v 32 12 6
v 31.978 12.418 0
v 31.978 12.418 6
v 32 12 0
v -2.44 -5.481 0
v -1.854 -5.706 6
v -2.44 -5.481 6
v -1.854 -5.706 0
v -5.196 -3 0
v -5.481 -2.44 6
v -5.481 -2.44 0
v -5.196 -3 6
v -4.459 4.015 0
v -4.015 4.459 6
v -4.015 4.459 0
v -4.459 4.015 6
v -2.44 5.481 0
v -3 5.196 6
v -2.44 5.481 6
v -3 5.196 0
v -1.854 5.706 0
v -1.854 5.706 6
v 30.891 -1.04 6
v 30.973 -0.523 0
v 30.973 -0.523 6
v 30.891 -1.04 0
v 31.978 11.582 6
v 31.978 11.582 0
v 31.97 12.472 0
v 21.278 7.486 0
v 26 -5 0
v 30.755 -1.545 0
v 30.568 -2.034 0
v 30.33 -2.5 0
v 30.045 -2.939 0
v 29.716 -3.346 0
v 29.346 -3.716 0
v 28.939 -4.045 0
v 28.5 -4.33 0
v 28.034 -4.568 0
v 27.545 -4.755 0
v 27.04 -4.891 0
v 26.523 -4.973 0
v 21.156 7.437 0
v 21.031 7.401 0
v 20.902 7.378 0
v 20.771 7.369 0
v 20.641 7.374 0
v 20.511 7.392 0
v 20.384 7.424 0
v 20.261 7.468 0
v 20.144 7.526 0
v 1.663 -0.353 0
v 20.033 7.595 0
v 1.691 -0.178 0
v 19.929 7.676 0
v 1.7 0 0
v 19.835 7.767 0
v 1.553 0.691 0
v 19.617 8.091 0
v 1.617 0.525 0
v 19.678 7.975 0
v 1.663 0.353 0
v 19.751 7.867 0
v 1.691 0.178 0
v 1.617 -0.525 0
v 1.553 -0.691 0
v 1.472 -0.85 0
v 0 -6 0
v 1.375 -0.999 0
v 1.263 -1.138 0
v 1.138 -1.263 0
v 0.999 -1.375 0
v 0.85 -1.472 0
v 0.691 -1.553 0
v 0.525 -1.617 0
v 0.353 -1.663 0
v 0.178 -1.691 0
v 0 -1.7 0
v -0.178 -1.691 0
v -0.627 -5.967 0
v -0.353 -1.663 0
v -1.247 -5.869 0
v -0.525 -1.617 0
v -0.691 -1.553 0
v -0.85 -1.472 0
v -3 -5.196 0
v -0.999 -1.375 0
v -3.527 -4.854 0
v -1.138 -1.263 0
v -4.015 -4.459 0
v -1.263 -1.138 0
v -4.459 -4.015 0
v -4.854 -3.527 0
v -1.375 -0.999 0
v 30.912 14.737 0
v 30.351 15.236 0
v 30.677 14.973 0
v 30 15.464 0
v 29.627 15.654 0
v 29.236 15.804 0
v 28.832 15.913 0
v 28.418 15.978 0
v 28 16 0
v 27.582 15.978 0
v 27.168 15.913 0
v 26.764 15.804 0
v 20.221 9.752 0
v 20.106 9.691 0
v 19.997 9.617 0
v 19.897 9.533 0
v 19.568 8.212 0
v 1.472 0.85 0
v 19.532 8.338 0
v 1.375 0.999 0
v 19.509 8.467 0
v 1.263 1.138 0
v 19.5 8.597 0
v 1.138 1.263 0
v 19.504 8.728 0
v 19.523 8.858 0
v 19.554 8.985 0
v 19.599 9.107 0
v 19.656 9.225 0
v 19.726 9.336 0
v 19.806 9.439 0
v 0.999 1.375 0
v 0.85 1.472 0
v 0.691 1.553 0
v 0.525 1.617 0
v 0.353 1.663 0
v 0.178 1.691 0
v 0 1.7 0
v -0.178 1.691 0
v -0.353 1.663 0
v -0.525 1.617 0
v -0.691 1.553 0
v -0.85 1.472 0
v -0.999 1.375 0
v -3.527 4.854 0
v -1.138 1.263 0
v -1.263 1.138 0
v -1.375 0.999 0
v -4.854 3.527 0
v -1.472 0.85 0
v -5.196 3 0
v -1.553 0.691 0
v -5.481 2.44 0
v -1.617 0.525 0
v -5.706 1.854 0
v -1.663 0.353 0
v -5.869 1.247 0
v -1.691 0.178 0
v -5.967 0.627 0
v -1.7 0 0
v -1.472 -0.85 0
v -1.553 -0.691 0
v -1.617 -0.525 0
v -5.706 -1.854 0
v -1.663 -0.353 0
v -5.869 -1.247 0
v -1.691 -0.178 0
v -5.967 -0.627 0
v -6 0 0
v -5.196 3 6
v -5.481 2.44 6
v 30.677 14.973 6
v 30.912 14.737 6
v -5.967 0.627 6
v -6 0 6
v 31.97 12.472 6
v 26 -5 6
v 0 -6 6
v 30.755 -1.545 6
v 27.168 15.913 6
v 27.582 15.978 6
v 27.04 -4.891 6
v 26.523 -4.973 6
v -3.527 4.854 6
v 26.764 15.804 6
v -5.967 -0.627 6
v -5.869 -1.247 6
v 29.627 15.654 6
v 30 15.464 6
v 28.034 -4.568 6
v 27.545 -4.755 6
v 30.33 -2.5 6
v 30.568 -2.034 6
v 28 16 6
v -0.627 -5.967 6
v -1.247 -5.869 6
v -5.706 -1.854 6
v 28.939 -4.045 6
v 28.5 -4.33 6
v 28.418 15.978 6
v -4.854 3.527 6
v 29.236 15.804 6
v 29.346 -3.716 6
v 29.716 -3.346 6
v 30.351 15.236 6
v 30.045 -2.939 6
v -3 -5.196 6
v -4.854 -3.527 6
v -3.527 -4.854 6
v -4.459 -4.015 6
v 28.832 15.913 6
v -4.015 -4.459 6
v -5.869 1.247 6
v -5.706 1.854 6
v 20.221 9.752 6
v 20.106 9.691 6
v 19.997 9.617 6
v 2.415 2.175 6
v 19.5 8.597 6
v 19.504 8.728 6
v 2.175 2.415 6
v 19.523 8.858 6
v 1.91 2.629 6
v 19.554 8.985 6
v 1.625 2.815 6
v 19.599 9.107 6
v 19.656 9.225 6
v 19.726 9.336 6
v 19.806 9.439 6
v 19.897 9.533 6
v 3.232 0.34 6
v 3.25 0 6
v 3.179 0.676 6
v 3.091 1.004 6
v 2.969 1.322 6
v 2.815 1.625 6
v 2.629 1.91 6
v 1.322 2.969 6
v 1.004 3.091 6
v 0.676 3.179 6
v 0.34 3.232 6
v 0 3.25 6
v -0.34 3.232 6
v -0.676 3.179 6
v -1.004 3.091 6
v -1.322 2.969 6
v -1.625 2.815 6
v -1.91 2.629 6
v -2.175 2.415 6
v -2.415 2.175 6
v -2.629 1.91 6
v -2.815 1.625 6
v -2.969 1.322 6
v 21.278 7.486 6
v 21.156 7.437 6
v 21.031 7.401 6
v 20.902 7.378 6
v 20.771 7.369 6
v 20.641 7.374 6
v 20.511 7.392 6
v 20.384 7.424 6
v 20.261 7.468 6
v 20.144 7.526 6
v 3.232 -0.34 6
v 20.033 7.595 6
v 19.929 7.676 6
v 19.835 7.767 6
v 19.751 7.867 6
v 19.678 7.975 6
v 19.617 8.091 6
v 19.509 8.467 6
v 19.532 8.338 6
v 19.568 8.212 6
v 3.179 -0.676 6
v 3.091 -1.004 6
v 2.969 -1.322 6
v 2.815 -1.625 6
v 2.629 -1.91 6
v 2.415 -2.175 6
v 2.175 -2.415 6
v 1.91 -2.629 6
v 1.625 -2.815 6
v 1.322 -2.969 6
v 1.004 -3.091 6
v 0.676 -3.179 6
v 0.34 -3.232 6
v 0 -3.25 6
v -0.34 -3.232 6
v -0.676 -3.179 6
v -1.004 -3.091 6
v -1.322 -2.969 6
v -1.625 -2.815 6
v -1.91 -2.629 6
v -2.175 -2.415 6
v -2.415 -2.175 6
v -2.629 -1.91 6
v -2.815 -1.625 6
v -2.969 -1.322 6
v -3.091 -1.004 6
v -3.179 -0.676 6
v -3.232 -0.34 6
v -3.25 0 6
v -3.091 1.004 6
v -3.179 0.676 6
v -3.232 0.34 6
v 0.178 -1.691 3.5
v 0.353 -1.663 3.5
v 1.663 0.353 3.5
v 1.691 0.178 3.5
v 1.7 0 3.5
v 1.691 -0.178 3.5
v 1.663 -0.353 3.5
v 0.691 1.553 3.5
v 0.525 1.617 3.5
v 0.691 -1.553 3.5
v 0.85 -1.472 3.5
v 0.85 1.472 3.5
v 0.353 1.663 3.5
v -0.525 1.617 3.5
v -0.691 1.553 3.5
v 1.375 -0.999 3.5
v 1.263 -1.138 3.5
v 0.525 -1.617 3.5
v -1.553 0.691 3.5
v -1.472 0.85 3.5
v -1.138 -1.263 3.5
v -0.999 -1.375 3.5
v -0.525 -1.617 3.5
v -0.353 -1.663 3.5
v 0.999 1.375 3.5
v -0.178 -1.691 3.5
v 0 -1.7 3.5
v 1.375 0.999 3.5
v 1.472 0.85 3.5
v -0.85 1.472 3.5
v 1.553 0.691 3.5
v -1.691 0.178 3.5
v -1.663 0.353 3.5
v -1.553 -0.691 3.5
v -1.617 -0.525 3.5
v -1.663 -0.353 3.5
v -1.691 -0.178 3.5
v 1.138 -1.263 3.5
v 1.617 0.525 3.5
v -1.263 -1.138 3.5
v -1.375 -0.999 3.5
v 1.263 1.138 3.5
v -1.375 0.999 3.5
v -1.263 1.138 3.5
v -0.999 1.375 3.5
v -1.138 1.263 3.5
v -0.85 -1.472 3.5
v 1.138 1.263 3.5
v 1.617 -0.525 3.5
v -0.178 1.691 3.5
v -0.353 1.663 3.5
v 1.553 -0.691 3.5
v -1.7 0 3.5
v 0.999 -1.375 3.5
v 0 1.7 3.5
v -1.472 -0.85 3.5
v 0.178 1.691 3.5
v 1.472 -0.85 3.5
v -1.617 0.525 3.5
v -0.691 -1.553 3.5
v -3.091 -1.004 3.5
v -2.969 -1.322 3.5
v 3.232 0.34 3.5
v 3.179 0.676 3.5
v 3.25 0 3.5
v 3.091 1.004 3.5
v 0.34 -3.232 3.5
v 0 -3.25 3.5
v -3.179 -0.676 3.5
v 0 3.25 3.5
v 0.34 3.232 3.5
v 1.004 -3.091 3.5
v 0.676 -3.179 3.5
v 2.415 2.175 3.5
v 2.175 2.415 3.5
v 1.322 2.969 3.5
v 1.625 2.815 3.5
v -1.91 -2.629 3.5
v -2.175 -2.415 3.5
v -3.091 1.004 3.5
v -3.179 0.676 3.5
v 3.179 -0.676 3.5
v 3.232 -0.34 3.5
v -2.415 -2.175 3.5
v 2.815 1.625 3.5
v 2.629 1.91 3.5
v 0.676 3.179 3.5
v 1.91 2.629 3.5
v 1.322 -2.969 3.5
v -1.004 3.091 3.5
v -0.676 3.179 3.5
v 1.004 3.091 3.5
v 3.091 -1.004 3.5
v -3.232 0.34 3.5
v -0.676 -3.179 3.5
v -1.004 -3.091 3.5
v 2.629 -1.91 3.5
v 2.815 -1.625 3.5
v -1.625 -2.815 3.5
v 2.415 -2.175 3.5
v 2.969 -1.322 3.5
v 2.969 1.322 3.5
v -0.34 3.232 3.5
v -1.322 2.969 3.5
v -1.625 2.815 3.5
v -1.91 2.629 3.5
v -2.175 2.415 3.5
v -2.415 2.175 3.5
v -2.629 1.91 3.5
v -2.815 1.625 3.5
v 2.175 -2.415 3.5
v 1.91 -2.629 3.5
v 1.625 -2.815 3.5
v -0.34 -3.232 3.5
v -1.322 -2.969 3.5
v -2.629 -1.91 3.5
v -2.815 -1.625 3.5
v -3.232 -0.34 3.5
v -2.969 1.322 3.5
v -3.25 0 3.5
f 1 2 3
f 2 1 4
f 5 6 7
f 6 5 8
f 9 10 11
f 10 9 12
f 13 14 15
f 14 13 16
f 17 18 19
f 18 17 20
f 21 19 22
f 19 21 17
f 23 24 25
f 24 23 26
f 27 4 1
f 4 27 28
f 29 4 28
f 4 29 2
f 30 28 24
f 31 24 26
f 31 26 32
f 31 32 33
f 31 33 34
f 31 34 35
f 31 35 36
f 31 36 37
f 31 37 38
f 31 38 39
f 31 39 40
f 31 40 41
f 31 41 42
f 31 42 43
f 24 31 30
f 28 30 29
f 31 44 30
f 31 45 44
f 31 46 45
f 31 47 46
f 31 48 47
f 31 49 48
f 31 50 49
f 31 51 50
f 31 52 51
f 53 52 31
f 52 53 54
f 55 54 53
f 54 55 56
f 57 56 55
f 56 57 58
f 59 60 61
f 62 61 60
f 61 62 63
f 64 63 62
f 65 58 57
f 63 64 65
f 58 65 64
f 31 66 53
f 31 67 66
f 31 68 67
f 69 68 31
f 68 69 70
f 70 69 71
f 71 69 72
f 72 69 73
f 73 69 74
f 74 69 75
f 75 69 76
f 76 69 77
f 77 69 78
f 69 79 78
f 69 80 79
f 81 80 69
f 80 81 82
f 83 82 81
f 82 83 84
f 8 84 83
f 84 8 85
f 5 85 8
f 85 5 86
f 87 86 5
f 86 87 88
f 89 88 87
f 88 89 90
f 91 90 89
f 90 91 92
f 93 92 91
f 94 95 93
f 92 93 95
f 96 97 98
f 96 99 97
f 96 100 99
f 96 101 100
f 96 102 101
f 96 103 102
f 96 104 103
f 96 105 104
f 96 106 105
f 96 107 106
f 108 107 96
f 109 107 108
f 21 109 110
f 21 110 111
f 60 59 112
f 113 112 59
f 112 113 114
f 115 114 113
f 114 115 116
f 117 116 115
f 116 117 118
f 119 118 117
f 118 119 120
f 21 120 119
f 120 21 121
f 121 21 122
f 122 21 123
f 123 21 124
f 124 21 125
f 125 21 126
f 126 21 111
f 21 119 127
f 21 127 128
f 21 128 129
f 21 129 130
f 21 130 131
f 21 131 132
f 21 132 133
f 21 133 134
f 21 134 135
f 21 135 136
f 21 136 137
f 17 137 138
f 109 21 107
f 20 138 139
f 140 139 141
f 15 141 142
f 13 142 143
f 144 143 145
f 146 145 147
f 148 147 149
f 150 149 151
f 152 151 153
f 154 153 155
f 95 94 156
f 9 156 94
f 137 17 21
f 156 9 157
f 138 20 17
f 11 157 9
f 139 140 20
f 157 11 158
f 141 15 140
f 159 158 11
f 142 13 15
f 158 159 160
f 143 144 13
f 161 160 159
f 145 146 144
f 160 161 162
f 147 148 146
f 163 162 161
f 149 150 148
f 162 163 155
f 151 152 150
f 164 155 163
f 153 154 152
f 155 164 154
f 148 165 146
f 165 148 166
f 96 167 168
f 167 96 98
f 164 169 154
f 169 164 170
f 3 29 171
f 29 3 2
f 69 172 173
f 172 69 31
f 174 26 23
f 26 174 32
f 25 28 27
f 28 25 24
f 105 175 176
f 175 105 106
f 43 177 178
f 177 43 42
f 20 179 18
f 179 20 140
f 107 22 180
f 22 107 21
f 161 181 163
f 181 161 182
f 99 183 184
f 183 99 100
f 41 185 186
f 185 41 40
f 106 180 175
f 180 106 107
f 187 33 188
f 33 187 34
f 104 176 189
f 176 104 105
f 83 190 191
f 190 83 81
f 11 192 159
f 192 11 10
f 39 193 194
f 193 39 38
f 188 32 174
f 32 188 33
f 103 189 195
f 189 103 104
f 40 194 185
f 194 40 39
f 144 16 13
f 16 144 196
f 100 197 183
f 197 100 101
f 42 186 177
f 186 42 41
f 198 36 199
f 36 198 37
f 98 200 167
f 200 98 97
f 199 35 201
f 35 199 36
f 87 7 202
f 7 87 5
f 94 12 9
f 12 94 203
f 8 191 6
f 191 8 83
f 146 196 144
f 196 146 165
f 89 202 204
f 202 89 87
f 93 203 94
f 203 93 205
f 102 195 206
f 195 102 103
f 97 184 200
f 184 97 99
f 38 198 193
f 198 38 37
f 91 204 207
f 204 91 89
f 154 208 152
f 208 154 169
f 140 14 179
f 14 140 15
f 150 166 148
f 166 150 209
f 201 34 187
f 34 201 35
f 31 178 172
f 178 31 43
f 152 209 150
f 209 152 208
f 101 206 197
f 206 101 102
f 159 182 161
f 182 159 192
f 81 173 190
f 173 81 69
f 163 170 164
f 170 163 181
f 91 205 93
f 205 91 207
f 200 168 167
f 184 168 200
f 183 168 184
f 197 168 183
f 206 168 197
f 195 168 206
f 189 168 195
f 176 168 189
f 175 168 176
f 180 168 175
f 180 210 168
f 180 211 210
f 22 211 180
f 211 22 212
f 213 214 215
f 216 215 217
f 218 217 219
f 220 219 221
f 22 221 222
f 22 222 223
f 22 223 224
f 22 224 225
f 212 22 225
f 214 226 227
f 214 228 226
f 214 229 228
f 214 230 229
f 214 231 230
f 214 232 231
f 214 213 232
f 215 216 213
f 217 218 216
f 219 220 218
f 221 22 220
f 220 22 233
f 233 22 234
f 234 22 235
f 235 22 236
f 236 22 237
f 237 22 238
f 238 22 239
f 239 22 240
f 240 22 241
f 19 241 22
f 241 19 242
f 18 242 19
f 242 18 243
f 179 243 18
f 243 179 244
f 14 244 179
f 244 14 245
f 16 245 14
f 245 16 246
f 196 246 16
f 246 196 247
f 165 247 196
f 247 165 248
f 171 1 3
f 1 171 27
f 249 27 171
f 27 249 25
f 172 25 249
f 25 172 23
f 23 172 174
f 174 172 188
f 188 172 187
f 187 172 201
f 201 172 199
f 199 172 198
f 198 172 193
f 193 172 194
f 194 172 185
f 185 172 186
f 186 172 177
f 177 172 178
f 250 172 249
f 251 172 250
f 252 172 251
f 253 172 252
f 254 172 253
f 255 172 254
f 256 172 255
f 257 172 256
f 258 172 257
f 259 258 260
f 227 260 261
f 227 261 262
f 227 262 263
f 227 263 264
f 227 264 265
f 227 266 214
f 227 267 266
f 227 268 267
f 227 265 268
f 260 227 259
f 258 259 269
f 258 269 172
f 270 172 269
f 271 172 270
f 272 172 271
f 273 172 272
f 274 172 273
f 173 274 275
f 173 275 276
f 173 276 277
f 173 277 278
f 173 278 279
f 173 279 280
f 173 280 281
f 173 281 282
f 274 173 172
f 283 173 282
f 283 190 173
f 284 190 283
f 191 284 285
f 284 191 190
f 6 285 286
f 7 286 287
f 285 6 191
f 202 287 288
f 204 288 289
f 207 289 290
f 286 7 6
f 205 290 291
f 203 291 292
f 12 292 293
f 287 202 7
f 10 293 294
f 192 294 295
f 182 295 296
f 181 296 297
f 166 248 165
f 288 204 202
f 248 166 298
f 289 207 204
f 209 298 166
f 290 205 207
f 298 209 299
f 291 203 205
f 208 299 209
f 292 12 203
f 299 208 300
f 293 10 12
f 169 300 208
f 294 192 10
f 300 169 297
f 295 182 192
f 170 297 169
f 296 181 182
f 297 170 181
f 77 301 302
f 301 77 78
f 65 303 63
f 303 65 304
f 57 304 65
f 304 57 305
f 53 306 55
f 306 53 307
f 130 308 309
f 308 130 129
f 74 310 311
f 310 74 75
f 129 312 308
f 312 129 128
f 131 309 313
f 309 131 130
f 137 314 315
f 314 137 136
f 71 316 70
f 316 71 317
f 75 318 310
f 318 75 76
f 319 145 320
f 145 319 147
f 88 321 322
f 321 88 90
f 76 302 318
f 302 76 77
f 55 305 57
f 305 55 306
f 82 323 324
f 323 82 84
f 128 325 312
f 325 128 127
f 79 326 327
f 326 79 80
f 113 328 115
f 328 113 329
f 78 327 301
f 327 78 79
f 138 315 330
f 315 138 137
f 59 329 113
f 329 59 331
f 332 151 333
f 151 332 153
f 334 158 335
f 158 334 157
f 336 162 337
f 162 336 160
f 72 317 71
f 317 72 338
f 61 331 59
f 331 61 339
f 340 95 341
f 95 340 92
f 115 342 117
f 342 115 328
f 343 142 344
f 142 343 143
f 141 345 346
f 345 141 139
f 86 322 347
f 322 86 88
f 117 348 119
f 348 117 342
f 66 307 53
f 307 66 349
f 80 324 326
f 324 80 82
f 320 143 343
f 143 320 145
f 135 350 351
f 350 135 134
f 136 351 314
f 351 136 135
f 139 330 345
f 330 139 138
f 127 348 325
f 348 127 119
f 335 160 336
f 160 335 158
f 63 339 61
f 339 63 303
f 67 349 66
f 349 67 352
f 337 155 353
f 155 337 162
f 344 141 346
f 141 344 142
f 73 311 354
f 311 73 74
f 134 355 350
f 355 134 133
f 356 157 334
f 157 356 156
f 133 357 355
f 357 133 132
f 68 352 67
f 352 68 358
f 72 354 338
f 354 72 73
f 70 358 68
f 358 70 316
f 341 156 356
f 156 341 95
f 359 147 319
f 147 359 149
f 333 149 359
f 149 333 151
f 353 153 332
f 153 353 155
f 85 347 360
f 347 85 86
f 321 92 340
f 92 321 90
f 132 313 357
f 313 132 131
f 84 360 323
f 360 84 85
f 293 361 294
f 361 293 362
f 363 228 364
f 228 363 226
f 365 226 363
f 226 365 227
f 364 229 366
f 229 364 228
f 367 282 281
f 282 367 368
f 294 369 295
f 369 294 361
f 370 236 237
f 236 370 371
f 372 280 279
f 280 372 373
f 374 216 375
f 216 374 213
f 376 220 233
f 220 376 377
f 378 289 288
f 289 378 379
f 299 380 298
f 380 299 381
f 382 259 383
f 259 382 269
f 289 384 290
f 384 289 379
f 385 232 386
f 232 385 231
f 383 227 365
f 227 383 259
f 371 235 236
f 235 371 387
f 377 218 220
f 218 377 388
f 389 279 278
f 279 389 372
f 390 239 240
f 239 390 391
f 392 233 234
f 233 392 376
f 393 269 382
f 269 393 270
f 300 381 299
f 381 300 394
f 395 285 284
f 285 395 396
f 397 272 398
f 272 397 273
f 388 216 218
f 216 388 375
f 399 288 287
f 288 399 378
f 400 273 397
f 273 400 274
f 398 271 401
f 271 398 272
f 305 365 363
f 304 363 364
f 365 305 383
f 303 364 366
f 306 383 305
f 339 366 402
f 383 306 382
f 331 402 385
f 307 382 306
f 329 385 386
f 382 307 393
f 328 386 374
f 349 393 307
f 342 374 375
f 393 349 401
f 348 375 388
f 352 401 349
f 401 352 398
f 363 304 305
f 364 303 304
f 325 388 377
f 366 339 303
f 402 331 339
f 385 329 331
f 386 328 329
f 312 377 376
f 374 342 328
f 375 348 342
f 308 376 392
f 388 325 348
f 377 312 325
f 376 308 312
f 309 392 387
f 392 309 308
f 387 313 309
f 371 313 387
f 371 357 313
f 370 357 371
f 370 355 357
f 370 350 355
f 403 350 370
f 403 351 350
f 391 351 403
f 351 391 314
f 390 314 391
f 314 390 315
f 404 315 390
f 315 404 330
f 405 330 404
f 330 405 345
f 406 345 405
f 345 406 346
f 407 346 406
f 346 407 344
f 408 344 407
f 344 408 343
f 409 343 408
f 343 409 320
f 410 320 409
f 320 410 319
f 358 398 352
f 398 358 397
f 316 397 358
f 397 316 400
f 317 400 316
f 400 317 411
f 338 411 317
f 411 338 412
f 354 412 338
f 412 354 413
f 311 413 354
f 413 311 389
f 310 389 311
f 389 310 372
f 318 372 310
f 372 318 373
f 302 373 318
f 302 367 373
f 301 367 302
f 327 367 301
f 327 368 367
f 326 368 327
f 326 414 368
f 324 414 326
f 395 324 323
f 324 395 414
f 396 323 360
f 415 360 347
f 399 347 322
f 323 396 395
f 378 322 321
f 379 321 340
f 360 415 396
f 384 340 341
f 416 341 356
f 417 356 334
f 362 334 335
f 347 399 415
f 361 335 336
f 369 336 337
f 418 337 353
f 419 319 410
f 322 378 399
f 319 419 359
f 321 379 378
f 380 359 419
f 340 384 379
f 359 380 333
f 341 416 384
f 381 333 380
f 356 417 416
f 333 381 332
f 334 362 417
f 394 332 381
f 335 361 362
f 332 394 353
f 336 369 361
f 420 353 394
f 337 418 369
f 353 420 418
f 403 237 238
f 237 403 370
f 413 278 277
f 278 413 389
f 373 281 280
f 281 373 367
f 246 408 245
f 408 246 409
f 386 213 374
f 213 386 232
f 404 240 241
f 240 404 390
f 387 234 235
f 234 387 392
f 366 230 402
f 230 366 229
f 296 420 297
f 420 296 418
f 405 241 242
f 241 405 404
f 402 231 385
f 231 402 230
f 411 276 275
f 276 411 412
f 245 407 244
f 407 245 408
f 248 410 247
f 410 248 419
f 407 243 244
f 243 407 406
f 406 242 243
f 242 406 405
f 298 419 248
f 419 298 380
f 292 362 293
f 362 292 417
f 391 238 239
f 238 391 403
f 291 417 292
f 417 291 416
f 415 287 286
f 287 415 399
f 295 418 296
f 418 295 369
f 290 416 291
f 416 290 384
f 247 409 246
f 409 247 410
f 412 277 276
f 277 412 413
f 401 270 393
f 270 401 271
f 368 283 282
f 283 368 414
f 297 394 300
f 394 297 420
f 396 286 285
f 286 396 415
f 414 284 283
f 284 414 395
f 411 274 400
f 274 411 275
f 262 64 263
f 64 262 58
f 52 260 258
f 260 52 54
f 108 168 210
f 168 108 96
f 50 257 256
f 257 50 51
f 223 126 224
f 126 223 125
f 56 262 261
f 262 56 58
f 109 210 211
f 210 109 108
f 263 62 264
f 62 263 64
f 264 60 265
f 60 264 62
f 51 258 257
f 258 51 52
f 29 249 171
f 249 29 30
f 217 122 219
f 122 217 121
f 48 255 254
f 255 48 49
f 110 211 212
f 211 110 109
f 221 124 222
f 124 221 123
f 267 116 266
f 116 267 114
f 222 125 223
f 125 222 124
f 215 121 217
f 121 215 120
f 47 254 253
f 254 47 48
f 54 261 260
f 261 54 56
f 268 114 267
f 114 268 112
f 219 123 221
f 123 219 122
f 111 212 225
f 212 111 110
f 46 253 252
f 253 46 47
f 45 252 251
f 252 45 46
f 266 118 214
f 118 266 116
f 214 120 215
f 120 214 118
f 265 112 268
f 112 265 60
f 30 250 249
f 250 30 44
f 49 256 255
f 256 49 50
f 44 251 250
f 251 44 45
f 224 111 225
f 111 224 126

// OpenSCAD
// Timbuk2 Custom Tuck - Quick-Release Locking Gate
$fn = 60;

// --- PARAMETERS ---
thick = 6;         
length = 26;       
pivot_dia = 3.4;   
head_dia = 12;     
tip_dia = 10;      
slot_width = 16;   
slot_thick = 2.5;  

difference() {
    hull() {
        cylinder(h=thick, d=head_dia); 
        translate([length, 0, 0]) cylinder(h=thick, d=tip_dia); 
        translate([length + 2, 12, 0]) cylinder(h=thick, d=8); 
    }
    translate([0, 0, -1]) cylinder(h=thick+2, d=pivot_dia);
    translate([0, 0, thick - 2.5]) cylinder(h=3.5, d=6.5);
    translate([length + 2, 12, -1]) rotate([0, 0, 25]) hull() {
        translate([-slot_width/2, 0, 0]) cylinder(h=thick+2, d=slot_thick);
        translate([slot_width/2, 0, 0]) cylinder(h=thick+2, d=slot_thick);
    }
}
